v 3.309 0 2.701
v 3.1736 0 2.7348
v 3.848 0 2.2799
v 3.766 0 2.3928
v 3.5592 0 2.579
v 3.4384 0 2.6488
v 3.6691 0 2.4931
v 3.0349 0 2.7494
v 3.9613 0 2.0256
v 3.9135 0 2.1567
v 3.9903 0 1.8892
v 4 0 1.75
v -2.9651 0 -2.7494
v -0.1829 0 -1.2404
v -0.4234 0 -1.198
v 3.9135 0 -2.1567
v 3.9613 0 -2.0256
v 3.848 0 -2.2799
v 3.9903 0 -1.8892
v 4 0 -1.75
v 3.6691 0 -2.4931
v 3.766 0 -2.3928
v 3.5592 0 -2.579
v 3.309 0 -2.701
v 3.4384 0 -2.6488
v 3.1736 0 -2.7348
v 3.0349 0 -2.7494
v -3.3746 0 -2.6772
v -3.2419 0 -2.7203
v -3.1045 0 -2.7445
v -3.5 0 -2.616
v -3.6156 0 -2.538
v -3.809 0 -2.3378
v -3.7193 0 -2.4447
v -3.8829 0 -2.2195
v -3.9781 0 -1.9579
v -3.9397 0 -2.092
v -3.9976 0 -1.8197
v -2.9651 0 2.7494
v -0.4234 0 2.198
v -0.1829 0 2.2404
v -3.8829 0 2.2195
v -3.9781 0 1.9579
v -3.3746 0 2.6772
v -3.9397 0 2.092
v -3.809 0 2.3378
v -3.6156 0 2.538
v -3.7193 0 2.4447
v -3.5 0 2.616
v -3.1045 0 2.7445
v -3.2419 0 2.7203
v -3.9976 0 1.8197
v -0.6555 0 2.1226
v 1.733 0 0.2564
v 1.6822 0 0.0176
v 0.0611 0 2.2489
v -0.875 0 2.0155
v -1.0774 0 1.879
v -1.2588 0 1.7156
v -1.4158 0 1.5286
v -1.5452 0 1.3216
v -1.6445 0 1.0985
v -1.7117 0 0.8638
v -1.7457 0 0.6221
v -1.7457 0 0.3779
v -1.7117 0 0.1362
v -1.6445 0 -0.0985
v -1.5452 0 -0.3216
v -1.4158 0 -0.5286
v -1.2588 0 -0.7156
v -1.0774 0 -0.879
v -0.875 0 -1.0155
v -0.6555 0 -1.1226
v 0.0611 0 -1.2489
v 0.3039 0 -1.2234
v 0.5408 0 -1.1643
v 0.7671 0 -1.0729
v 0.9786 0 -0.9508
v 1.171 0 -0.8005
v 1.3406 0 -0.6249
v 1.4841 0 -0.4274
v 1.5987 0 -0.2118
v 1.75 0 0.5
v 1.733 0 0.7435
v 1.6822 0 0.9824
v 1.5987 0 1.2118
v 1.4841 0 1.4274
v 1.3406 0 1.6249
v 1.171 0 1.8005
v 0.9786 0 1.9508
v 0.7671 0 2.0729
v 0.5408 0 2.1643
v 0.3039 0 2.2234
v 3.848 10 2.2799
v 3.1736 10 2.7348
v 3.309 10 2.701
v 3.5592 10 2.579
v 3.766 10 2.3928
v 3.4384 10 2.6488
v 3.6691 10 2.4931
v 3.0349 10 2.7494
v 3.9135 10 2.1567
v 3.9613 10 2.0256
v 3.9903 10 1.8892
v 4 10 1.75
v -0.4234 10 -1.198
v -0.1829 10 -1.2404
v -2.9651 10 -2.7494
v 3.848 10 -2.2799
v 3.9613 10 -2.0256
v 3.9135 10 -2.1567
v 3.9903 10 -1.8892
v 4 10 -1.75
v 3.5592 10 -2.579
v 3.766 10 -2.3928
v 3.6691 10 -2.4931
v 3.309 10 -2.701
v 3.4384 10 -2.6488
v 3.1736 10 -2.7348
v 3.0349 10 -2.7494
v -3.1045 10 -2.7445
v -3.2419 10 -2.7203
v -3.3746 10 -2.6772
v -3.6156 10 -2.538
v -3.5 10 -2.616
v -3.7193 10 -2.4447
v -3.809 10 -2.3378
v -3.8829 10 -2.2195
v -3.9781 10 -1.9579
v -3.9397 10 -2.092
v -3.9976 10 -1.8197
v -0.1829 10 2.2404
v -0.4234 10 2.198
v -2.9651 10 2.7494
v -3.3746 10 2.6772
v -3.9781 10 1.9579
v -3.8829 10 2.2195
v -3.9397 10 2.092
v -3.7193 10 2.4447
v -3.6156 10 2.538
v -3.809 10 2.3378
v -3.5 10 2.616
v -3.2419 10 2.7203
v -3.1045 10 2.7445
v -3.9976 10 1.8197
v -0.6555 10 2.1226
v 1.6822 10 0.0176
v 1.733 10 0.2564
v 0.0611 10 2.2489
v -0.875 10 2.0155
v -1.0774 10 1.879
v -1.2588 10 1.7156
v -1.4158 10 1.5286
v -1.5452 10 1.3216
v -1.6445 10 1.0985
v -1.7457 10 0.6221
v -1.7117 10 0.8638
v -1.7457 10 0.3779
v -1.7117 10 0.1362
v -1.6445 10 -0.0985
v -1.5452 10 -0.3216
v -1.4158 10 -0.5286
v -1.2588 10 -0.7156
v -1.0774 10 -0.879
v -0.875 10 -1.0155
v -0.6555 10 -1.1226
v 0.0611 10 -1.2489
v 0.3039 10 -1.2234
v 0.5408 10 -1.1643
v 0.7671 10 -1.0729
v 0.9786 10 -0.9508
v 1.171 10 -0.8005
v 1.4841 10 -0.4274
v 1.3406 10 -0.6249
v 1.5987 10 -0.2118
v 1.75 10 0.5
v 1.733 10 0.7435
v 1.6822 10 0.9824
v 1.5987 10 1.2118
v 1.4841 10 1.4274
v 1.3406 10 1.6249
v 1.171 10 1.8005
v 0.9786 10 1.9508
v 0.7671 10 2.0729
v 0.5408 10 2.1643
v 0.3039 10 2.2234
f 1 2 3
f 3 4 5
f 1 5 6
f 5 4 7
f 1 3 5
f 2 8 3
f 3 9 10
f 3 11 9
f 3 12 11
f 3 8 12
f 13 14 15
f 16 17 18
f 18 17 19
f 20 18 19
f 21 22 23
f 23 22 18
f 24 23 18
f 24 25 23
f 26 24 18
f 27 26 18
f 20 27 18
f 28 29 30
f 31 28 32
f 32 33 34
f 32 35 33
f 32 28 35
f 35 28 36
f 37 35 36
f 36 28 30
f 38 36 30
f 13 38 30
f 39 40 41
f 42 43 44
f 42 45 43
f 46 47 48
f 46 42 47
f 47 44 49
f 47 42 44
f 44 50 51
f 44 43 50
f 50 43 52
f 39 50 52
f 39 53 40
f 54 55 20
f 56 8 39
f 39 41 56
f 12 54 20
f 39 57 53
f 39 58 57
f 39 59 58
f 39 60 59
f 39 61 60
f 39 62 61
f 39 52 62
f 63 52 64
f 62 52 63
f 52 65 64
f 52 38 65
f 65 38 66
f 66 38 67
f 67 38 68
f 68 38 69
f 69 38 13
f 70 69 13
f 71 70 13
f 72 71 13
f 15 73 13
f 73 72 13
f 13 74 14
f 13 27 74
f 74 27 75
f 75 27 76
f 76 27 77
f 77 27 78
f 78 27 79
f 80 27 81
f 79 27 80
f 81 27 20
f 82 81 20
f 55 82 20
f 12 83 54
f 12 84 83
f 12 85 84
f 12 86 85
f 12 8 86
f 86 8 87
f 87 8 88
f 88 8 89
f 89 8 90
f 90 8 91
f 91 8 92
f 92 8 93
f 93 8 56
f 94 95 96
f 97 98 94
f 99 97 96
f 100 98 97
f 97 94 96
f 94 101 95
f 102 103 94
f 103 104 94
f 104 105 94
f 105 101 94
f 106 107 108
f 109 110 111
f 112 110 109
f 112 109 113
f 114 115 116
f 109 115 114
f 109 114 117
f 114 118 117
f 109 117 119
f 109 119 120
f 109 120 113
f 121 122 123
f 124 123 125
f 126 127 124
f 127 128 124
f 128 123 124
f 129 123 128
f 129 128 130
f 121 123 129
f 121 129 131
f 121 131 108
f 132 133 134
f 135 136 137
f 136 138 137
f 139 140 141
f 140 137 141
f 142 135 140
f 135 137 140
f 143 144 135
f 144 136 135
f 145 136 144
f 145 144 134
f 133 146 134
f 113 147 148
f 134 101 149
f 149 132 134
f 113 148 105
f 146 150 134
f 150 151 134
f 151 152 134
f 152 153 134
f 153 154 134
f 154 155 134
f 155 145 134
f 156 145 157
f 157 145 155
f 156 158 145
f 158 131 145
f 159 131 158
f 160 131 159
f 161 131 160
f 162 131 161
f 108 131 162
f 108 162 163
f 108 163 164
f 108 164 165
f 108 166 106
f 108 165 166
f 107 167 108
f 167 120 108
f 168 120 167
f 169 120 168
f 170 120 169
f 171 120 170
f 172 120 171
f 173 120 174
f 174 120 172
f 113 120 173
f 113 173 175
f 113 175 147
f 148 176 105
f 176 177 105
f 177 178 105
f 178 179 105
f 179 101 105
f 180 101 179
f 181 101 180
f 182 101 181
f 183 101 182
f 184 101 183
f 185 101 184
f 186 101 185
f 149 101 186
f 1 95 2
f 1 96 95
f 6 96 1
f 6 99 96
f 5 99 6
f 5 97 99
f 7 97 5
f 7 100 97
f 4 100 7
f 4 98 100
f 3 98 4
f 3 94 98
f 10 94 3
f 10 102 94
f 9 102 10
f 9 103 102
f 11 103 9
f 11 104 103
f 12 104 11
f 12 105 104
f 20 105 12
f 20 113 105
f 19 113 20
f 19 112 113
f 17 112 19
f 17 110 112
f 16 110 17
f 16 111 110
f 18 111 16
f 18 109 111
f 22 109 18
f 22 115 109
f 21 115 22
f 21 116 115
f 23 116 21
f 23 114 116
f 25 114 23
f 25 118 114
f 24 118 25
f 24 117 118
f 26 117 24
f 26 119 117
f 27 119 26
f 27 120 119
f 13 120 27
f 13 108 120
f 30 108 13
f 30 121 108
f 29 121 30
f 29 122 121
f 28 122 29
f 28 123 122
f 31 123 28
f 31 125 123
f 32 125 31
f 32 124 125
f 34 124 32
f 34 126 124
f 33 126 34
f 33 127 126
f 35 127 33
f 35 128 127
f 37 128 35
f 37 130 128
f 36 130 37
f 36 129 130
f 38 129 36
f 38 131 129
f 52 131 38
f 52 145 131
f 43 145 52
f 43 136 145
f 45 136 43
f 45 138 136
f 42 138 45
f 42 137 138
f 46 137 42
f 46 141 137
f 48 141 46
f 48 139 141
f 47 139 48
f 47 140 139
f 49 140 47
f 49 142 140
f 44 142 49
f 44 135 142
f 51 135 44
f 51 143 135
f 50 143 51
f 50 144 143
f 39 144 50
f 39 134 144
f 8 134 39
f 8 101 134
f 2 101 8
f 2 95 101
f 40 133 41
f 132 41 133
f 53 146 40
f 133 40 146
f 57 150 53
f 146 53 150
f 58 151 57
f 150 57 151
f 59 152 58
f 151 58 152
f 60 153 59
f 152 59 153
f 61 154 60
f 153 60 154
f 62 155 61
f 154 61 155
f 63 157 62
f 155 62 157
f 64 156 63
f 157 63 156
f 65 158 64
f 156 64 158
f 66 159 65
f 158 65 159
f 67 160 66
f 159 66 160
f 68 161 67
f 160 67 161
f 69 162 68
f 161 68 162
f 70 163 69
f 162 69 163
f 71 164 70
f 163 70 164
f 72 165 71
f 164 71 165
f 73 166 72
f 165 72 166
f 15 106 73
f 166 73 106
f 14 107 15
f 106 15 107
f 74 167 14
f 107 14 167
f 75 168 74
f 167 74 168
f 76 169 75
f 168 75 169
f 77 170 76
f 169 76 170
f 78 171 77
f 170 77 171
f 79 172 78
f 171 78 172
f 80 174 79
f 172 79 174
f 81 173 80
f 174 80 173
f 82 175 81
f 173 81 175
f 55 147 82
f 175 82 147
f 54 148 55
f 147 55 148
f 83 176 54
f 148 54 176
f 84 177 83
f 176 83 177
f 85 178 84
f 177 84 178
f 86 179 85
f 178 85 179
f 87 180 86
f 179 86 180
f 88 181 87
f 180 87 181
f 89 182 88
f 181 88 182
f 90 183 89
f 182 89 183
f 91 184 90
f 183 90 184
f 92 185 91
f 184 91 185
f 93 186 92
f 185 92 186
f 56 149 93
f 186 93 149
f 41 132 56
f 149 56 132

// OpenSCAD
$fn = 45;

rotate([-90,0,0])
linear_extrude(height = 10){
difference(){
    minkowski(convexity = 1){
    square([6,3.5], center = true);
    circle(d=2);
    }
    translate([0,-0.5]){
    circle(d=3.5);
    }
}
}
